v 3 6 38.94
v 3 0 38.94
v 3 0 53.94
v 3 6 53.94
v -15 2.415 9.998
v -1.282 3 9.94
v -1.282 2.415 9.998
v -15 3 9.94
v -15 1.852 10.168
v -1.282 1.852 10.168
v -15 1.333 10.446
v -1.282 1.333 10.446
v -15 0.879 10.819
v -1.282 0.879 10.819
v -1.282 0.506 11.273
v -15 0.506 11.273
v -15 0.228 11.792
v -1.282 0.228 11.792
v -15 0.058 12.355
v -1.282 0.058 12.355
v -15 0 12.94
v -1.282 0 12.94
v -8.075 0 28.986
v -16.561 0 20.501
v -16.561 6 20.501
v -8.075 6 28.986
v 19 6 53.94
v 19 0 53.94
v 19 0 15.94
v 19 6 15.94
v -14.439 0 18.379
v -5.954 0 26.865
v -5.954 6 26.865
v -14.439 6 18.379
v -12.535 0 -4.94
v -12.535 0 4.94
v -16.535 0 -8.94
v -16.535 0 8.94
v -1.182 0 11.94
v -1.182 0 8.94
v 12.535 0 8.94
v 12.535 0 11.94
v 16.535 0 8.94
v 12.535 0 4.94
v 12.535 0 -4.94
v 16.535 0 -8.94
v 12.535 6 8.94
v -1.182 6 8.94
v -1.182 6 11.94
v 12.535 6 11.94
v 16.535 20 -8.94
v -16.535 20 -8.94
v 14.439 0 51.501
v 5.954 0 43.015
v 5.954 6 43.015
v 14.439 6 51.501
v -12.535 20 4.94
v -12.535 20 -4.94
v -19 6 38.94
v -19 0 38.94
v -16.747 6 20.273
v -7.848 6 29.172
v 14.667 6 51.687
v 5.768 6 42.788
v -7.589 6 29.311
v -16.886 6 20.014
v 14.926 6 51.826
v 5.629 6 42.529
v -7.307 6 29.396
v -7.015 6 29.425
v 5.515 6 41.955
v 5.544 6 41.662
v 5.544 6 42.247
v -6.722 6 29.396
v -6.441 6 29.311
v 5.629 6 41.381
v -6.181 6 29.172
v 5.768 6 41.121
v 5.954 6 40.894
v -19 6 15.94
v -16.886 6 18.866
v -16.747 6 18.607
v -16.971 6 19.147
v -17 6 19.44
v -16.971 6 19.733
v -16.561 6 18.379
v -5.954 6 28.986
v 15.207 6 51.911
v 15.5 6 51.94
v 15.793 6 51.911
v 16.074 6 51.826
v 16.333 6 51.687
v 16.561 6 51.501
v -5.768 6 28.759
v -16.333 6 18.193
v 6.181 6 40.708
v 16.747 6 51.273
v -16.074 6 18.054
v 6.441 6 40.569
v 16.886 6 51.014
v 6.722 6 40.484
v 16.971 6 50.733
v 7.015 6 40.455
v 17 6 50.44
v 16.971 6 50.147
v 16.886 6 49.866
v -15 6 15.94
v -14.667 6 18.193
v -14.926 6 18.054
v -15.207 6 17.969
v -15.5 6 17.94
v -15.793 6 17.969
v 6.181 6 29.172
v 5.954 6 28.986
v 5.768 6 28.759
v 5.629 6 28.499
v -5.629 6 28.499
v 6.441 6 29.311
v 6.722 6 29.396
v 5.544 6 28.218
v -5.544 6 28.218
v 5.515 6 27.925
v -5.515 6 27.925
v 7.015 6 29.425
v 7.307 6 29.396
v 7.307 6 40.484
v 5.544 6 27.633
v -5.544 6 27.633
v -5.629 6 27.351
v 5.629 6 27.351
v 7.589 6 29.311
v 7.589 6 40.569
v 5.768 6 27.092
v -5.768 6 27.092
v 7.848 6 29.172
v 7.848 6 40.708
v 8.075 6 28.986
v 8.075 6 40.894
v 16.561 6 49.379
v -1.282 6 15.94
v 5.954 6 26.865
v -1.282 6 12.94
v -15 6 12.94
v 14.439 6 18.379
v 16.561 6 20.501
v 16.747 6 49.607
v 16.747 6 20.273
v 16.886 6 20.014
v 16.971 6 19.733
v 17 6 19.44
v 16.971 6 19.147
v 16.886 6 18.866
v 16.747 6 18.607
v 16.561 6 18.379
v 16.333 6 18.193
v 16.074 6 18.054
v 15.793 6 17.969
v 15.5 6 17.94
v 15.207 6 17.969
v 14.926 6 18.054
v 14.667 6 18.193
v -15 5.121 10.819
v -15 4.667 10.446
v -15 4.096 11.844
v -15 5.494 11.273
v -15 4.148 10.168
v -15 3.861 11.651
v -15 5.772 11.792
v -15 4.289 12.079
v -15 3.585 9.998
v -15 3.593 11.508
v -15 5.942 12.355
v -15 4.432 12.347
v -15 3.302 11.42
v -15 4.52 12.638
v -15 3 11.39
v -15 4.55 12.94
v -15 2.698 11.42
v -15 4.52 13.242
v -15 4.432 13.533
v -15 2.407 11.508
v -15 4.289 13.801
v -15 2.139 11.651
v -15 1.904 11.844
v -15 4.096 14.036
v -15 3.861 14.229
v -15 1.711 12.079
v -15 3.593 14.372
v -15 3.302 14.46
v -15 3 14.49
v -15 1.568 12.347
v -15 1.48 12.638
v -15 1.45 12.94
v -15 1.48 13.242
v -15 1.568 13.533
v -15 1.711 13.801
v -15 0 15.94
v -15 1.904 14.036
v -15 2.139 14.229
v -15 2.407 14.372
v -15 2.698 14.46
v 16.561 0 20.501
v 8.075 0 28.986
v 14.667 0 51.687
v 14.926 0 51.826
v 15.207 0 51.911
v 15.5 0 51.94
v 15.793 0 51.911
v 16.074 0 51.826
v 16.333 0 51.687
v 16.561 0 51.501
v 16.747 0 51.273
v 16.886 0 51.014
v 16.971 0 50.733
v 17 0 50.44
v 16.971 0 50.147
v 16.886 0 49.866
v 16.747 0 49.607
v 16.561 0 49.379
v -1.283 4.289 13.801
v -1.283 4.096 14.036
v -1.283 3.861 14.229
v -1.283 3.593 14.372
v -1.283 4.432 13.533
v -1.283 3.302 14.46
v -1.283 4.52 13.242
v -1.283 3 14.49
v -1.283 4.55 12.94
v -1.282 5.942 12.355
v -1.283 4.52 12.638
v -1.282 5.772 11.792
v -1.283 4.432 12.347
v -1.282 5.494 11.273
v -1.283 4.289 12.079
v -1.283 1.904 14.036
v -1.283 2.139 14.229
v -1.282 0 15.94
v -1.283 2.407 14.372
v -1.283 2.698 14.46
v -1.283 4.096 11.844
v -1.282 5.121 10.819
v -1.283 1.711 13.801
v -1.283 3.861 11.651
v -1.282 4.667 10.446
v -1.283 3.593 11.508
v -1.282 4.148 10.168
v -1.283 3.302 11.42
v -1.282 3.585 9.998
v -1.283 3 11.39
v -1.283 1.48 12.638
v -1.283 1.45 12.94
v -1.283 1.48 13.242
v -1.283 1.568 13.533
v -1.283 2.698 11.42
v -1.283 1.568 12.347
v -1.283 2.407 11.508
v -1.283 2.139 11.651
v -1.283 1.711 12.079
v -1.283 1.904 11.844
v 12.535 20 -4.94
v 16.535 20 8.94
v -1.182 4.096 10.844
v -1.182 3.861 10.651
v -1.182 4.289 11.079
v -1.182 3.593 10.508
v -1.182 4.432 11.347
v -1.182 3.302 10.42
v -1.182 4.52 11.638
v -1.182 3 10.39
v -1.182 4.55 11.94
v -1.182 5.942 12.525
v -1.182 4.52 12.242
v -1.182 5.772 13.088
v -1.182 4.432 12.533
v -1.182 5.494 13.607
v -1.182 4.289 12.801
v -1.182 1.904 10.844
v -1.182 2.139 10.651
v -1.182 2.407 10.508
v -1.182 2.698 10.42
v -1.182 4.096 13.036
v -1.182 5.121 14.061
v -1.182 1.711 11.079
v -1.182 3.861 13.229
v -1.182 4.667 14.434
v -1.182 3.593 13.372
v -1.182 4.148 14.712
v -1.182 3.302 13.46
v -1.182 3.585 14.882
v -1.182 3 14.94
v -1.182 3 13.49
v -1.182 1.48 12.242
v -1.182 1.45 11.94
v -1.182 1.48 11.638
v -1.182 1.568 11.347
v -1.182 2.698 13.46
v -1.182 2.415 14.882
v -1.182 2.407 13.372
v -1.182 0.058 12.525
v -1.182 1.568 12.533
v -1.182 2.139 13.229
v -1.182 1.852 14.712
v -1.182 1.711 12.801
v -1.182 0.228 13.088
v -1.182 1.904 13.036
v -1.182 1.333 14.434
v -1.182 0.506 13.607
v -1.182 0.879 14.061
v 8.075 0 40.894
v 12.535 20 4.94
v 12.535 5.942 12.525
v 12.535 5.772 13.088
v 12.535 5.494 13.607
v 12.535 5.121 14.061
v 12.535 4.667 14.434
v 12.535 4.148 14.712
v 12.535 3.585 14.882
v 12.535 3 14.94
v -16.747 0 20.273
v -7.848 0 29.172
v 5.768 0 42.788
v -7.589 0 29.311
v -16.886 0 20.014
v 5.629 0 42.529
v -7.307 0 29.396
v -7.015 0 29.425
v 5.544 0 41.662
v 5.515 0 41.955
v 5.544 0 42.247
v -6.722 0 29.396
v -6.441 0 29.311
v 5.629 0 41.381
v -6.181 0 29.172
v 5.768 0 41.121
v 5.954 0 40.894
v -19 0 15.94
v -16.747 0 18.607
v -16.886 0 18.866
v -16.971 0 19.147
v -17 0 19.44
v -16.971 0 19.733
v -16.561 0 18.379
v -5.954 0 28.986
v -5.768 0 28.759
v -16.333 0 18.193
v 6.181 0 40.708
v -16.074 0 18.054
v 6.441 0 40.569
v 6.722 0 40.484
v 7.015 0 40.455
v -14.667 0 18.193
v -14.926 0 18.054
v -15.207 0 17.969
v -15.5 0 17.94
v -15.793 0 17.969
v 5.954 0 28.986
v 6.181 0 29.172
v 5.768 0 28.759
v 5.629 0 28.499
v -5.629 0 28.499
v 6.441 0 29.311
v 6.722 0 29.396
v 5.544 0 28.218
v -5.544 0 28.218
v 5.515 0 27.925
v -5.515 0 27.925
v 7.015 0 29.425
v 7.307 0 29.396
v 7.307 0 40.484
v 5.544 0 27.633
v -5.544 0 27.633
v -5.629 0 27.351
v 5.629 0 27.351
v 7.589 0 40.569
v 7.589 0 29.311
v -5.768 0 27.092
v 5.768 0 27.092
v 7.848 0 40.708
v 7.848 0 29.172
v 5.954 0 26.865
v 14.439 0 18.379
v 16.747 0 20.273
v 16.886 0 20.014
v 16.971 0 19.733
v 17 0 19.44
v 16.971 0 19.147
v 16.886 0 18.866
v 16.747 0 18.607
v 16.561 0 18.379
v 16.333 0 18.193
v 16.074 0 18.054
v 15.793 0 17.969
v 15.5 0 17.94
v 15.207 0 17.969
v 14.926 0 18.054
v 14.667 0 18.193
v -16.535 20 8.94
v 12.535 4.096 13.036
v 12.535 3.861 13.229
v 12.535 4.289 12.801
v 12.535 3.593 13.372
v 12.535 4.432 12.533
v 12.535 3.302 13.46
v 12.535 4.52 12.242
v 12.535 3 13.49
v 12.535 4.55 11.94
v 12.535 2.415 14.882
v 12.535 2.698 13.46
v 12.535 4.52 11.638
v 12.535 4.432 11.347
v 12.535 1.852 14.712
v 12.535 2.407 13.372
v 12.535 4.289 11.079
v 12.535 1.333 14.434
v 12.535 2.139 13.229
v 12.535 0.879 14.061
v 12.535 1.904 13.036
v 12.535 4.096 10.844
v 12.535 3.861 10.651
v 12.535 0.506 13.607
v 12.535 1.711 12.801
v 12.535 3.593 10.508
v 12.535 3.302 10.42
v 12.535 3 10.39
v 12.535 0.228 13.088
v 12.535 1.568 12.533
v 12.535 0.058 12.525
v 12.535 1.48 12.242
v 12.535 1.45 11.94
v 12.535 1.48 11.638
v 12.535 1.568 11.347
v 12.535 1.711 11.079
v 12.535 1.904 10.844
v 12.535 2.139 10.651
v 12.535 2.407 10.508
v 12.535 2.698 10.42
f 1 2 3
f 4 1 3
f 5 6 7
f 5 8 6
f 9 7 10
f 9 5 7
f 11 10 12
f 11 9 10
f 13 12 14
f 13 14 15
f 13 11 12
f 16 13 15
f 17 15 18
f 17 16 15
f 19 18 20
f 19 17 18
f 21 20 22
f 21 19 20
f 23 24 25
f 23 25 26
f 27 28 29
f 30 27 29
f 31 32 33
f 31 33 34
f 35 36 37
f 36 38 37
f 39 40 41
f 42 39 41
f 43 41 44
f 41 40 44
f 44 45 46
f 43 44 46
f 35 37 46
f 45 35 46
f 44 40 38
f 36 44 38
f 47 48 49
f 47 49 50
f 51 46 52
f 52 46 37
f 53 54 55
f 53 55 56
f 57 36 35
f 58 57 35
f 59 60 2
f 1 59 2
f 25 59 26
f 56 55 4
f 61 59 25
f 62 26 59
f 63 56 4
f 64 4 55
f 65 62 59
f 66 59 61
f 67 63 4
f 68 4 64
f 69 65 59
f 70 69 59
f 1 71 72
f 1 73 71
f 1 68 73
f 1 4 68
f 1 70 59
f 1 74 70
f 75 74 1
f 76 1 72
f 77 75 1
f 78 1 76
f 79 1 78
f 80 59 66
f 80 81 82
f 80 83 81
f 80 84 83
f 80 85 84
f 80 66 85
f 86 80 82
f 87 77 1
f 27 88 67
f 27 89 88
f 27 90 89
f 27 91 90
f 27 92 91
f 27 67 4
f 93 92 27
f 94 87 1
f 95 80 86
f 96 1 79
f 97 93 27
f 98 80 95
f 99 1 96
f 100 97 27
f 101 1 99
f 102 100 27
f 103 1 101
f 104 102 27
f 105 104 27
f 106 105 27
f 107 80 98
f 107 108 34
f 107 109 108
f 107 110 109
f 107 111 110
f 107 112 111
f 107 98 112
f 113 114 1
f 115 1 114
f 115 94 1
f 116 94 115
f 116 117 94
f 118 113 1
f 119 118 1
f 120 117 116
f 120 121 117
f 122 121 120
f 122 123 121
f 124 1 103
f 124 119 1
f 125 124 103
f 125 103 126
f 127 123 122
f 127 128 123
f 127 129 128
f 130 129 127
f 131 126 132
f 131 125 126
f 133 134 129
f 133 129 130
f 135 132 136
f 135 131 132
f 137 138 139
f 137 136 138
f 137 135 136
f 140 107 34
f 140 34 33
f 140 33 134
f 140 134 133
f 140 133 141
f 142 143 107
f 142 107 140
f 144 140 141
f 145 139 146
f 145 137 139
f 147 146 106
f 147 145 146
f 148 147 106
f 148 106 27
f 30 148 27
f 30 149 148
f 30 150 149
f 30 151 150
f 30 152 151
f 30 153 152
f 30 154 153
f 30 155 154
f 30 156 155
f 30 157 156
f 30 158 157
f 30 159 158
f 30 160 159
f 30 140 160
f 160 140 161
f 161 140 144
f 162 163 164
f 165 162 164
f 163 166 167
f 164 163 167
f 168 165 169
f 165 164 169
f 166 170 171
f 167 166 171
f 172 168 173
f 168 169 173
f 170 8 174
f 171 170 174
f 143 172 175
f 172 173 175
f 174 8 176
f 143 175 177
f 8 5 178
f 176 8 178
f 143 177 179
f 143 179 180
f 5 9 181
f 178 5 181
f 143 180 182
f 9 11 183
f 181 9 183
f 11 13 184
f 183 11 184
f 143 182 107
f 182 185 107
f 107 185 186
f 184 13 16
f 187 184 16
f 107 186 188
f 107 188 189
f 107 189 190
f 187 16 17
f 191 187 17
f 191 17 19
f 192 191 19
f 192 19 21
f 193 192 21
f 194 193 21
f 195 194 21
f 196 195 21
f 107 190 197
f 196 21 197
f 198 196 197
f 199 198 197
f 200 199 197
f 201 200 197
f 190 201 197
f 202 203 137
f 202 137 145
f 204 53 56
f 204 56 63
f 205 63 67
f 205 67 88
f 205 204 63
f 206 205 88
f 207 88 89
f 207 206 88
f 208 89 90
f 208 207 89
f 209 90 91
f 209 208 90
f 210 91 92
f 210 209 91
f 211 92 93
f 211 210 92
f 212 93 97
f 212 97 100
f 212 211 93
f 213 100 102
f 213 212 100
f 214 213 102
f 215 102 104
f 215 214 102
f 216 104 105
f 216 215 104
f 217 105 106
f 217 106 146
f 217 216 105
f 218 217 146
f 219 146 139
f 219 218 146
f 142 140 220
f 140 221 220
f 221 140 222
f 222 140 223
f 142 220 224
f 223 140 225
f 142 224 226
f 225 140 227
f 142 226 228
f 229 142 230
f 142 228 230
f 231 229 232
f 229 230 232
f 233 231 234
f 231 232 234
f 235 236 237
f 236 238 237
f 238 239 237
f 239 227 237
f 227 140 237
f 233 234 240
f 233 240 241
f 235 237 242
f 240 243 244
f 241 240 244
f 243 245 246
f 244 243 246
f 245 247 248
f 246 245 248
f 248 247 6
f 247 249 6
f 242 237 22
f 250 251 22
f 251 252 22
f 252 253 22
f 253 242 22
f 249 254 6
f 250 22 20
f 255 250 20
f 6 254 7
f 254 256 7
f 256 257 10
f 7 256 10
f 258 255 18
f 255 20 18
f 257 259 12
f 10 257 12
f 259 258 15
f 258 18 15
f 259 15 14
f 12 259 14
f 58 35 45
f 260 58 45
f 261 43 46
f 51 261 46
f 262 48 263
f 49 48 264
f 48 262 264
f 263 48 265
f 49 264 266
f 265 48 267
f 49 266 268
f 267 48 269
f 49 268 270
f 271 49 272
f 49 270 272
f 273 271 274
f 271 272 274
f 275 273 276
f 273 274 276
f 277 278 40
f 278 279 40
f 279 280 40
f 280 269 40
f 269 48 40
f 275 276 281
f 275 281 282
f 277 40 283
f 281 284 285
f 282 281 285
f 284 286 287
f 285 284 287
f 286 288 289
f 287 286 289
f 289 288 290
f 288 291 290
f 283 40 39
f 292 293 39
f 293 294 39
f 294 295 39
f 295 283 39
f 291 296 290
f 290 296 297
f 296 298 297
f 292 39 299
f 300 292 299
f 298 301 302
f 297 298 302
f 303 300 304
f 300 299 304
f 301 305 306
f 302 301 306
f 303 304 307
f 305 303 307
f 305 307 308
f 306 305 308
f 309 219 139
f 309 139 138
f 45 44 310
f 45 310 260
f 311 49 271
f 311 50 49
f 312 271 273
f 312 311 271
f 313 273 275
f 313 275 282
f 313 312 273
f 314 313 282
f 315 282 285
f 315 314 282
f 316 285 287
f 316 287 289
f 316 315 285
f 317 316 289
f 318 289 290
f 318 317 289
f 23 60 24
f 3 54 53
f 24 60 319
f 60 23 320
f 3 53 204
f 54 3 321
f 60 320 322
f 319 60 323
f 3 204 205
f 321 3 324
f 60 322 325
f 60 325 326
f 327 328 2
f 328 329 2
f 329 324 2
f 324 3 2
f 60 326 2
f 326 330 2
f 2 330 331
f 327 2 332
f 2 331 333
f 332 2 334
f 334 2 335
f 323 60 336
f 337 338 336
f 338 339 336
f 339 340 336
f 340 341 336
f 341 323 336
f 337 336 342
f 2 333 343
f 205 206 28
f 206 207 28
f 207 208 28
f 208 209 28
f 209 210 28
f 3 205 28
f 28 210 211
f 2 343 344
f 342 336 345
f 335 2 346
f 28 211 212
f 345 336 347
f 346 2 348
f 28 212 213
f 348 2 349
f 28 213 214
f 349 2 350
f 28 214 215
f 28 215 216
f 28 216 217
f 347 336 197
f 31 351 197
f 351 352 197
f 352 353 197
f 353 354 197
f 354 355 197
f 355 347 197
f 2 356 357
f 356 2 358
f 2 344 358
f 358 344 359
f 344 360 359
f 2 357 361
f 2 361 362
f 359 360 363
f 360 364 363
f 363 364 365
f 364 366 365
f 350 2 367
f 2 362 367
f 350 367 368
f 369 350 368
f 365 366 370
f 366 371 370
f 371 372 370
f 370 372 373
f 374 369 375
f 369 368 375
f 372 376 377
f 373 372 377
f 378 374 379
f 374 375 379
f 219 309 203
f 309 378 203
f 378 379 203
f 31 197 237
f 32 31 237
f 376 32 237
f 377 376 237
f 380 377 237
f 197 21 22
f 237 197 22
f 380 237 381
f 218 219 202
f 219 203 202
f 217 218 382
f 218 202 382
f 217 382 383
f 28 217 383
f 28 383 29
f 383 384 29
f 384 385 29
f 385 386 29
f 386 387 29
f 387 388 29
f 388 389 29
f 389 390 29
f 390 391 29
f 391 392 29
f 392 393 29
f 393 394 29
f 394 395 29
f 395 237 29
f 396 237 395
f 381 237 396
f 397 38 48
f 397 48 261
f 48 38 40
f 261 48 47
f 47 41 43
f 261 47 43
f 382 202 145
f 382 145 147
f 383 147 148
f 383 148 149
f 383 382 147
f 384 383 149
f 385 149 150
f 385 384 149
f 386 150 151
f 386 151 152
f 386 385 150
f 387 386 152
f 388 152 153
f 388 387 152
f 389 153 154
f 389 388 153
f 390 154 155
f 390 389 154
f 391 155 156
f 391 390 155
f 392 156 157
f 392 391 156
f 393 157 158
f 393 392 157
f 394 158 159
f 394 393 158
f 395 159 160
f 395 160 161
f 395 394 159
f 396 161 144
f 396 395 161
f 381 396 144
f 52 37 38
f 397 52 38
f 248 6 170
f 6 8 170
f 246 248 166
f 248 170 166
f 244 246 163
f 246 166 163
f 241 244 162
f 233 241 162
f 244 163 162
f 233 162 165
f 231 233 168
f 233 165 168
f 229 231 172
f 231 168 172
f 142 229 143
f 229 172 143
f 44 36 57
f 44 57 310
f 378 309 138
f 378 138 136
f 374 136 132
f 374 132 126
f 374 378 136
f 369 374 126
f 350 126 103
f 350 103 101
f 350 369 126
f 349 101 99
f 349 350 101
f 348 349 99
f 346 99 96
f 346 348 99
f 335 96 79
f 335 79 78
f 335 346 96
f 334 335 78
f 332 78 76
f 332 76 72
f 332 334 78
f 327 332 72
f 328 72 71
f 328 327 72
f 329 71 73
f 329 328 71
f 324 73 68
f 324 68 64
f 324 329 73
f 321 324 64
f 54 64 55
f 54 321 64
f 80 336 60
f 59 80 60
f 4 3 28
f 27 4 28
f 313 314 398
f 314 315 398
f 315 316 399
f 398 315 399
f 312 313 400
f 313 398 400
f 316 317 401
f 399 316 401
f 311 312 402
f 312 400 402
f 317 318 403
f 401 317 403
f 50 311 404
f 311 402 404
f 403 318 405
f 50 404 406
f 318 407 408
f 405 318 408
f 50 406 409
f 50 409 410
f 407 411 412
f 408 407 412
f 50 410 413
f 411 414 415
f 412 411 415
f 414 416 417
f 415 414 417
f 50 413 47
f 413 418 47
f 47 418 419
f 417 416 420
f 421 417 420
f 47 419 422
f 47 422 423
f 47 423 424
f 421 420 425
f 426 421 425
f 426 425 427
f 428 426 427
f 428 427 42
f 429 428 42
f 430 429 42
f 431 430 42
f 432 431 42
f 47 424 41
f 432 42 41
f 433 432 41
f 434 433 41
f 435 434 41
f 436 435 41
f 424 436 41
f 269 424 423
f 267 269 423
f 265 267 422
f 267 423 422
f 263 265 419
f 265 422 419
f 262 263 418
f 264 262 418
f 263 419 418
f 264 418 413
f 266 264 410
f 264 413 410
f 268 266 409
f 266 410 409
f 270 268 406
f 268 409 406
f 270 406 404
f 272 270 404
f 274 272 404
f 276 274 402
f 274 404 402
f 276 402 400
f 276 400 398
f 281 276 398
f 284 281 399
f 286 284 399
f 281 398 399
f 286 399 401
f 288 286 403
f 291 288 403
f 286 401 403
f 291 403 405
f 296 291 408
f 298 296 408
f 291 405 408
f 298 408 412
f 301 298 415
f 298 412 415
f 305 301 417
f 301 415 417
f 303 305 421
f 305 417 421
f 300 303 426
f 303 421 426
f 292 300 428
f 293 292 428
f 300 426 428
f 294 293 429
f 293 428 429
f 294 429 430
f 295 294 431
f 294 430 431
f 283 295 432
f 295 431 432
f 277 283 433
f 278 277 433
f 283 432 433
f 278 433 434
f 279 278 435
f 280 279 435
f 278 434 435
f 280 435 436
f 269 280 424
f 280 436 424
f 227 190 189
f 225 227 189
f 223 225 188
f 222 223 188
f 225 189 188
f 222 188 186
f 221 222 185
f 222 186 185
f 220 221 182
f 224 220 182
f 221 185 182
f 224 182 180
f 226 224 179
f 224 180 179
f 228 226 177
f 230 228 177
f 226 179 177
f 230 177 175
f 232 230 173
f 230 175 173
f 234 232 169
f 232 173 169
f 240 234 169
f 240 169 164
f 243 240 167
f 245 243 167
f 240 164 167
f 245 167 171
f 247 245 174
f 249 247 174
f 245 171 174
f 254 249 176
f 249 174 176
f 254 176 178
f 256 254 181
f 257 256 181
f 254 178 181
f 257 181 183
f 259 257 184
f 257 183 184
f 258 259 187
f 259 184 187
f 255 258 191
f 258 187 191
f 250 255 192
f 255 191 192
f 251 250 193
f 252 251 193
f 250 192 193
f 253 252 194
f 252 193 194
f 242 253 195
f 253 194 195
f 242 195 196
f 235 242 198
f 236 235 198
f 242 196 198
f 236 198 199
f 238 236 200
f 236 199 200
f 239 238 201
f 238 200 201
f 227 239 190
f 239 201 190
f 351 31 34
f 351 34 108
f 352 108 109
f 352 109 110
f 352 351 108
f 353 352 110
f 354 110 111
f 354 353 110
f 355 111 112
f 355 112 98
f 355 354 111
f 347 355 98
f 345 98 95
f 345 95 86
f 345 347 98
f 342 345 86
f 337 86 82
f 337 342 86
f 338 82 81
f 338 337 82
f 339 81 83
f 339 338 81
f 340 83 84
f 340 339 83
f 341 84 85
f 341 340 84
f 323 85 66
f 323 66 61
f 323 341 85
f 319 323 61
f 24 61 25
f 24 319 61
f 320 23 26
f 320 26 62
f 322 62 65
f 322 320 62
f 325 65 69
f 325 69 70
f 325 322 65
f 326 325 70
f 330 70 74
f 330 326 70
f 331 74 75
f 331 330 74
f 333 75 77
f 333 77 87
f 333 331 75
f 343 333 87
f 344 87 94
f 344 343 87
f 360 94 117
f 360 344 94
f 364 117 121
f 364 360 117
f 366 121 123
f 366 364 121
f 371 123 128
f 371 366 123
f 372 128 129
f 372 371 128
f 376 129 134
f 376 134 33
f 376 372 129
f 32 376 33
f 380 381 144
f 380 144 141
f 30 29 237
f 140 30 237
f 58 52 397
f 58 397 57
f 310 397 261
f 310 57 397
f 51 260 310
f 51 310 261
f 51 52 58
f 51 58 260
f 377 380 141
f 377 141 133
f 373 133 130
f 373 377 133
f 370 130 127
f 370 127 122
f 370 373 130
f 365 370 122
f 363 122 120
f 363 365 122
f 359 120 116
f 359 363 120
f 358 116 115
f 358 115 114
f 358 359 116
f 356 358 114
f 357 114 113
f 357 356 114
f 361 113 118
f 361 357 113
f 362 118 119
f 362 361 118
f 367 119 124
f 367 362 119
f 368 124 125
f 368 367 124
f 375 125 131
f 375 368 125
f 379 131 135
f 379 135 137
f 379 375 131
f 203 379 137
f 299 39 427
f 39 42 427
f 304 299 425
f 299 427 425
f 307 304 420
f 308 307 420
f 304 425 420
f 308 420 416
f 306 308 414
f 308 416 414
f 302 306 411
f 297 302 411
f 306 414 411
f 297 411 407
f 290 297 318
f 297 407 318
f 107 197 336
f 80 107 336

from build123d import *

# Parameters (mm, degrees)
SKETCH1_W             = 25.07
SKETCH1_H             = 9.88
BOSS_EXTRUDE1_DEPTH   = 6
BOSS_EXTRUDE1_2_DEPTH = 6
SKETCH1_3_W           = 33.07
SKETCH1_3_H           = 17.88
SKETCH1_3_W_2         = 25.07
SKETCH1_3_H_2         = 9.88
BOSS_EXTRUDE2_DEPTH   = 20
FILLET1_R             = 3
FILLET2_R             = 3
SKETCH2_R             = 1.55
CUT_EXTRUDE1_DEPTH    = 13.7175
SKETCH4_R             = 1.55
CUT_EXTRUDE2_DEPTH    = 13.7175
CUT_EXTRUDE3_DEPTH    = 6


with BuildPart() as part:
    # Sketch1 → Boss-Extrude1 (new body)
    with BuildSketch(Plane(origin=(0, 0, 0), x_dir=(1, 0, 0), z_dir=(0, 1, 0))):
        Polygon((16.535, -8.94), (16.535, 8.94), (-16.535, 8.94), (-16.535, -8.94), (-1.1825, -8.94), (-1.1825, -14.94), (12.535, -14.94), (12.535, -8.94), align=None)
        Rectangle(SKETCH1_W, SKETCH1_H, mode=Mode.SUBTRACT)
    extrude(amount=BOSS_EXTRUDE1_DEPTH)

    # Sketch1<3> → Boss-Extrude2 (add)
    with BuildSketch(Plane(origin=(0, 0, 0), x_dir=(1, 0, 0), z_dir=(0, 1, 0))):
        Rectangle(SKETCH1_3_W, SKETCH1_3_H)
        Rectangle(SKETCH1_3_W_2, SKETCH1_3_H_2, mode=Mode.SUBTRACT)
    extrude(amount=BOSS_EXTRUDE2_DEPTH)

    # Fillet1
    fillet1_edges = [part.edges().sort_by_distance(p)[0] for p in [
        (5.67625, 0, 14.94),
        (5.67625, 6, 14.94),
    ]]
    fillet(fillet1_edges, radius=FILLET1_R - 0.0001)  # a hair under: the kernel refuses the full size

    # Sketch2 → Cut-Extrude1 (cut)
    with BuildSketch(Plane(origin=(12.535, 0, 0), x_dir=(0, 0, -1), z_dir=(1, 0, 0))):
        with Locations((-11.94, 3)):
            Circle(SKETCH2_R)
    extrude(amount=-CUT_EXTRUDE1_DEPTH, mode=Mode.SUBTRACT)


with BuildPart() as body_2:
    # Sketch1 → Boss-Extrude1 2 (new body)
    with BuildSketch(Plane(origin=(0, 0, 0), x_dir=(1, 0, 0), z_dir=(0, 1, 0))):
        Polygon((-1.2825, -15.94), (-1.2825, -9.94), (-15, -9.94), (-15, -15.94), (-19, -15.94), (-19, -38.94), (3, -38.94), (3, -53.94), (19, -53.94), (19, -15.94), align=None)
    extrude(amount=BOSS_EXTRUDE1_2_DEPTH)

    # Fillet2
    fillet2_edges = [body_2.edges().sort_by_distance(p)[0] for p in [
        (-8.14125, 0, 9.94),
        (-8.14125, 6, 9.94),
    ]]
    fillet(fillet2_edges, radius=FILLET2_R - 0.0001)  # a hair under: the kernel refuses the full size

    # Sketch4 → Cut-Extrude2 (cut)
    with BuildSketch(Plane.ZY.offset(15)):
        with Locations((12.94, 3)):
            Circle(SKETCH4_R)
    extrude(amount=-CUT_EXTRUDE2_DEPTH, mode=Mode.SUBTRACT)

    # Sketch5 → Cut-Extrude3 (cut)
    with BuildSketch(Plane.XZ):
        with BuildLine():
            Line((-16.560660172, 20.500660172), (-8.075378798, 28.985941546))
            ThreePointArc((-8.075378798, 28.985941546), (-5.954058454, 28.985941546), (-5.954058454, 26.864621202))
            Line((-5.954058454, 26.864621202), (-14.439339828, 18.379339828))
            ThreePointArc((-14.439339828, 18.379339828), (-16.560660172, 18.379339828), (-16.560660172, 20.500660172))
        make_face()
        with BuildLine():
            Line((16.560660172, 49.379339828), (8.075378798, 40.894058454))
            ThreePointArc((8.075378798, 40.894058454), (5.954058454, 40.894058454), (5.954058454, 43.015378798))
            Line((5.954058454, 43.015378798), (14.439339828, 51.500660172))
            ThreePointArc((14.439339828, 51.500660172), (16.560660172, 51.500660172), (16.560660172, 49.379339828))
        make_face()
        with BuildLine():
            Line((14.439339828, 18.379339828), (5.954058454, 26.864621202))
            ThreePointArc((5.954058454, 26.864621202), (5.954058454, 28.985941546), (8.075378798, 28.985941546))
            Line((8.075378798, 28.985941546), (16.560660172, 20.500660172))
            ThreePointArc((16.560660172, 20.500660172), (16.560660172, 18.379339828), (14.439339828, 18.379339828))
        make_face()
    extrude(amount=-CUT_EXTRUDE3_DEPTH, mode=Mode.SUBTRACT)


solid = Compound([part.part, body_2.part])
